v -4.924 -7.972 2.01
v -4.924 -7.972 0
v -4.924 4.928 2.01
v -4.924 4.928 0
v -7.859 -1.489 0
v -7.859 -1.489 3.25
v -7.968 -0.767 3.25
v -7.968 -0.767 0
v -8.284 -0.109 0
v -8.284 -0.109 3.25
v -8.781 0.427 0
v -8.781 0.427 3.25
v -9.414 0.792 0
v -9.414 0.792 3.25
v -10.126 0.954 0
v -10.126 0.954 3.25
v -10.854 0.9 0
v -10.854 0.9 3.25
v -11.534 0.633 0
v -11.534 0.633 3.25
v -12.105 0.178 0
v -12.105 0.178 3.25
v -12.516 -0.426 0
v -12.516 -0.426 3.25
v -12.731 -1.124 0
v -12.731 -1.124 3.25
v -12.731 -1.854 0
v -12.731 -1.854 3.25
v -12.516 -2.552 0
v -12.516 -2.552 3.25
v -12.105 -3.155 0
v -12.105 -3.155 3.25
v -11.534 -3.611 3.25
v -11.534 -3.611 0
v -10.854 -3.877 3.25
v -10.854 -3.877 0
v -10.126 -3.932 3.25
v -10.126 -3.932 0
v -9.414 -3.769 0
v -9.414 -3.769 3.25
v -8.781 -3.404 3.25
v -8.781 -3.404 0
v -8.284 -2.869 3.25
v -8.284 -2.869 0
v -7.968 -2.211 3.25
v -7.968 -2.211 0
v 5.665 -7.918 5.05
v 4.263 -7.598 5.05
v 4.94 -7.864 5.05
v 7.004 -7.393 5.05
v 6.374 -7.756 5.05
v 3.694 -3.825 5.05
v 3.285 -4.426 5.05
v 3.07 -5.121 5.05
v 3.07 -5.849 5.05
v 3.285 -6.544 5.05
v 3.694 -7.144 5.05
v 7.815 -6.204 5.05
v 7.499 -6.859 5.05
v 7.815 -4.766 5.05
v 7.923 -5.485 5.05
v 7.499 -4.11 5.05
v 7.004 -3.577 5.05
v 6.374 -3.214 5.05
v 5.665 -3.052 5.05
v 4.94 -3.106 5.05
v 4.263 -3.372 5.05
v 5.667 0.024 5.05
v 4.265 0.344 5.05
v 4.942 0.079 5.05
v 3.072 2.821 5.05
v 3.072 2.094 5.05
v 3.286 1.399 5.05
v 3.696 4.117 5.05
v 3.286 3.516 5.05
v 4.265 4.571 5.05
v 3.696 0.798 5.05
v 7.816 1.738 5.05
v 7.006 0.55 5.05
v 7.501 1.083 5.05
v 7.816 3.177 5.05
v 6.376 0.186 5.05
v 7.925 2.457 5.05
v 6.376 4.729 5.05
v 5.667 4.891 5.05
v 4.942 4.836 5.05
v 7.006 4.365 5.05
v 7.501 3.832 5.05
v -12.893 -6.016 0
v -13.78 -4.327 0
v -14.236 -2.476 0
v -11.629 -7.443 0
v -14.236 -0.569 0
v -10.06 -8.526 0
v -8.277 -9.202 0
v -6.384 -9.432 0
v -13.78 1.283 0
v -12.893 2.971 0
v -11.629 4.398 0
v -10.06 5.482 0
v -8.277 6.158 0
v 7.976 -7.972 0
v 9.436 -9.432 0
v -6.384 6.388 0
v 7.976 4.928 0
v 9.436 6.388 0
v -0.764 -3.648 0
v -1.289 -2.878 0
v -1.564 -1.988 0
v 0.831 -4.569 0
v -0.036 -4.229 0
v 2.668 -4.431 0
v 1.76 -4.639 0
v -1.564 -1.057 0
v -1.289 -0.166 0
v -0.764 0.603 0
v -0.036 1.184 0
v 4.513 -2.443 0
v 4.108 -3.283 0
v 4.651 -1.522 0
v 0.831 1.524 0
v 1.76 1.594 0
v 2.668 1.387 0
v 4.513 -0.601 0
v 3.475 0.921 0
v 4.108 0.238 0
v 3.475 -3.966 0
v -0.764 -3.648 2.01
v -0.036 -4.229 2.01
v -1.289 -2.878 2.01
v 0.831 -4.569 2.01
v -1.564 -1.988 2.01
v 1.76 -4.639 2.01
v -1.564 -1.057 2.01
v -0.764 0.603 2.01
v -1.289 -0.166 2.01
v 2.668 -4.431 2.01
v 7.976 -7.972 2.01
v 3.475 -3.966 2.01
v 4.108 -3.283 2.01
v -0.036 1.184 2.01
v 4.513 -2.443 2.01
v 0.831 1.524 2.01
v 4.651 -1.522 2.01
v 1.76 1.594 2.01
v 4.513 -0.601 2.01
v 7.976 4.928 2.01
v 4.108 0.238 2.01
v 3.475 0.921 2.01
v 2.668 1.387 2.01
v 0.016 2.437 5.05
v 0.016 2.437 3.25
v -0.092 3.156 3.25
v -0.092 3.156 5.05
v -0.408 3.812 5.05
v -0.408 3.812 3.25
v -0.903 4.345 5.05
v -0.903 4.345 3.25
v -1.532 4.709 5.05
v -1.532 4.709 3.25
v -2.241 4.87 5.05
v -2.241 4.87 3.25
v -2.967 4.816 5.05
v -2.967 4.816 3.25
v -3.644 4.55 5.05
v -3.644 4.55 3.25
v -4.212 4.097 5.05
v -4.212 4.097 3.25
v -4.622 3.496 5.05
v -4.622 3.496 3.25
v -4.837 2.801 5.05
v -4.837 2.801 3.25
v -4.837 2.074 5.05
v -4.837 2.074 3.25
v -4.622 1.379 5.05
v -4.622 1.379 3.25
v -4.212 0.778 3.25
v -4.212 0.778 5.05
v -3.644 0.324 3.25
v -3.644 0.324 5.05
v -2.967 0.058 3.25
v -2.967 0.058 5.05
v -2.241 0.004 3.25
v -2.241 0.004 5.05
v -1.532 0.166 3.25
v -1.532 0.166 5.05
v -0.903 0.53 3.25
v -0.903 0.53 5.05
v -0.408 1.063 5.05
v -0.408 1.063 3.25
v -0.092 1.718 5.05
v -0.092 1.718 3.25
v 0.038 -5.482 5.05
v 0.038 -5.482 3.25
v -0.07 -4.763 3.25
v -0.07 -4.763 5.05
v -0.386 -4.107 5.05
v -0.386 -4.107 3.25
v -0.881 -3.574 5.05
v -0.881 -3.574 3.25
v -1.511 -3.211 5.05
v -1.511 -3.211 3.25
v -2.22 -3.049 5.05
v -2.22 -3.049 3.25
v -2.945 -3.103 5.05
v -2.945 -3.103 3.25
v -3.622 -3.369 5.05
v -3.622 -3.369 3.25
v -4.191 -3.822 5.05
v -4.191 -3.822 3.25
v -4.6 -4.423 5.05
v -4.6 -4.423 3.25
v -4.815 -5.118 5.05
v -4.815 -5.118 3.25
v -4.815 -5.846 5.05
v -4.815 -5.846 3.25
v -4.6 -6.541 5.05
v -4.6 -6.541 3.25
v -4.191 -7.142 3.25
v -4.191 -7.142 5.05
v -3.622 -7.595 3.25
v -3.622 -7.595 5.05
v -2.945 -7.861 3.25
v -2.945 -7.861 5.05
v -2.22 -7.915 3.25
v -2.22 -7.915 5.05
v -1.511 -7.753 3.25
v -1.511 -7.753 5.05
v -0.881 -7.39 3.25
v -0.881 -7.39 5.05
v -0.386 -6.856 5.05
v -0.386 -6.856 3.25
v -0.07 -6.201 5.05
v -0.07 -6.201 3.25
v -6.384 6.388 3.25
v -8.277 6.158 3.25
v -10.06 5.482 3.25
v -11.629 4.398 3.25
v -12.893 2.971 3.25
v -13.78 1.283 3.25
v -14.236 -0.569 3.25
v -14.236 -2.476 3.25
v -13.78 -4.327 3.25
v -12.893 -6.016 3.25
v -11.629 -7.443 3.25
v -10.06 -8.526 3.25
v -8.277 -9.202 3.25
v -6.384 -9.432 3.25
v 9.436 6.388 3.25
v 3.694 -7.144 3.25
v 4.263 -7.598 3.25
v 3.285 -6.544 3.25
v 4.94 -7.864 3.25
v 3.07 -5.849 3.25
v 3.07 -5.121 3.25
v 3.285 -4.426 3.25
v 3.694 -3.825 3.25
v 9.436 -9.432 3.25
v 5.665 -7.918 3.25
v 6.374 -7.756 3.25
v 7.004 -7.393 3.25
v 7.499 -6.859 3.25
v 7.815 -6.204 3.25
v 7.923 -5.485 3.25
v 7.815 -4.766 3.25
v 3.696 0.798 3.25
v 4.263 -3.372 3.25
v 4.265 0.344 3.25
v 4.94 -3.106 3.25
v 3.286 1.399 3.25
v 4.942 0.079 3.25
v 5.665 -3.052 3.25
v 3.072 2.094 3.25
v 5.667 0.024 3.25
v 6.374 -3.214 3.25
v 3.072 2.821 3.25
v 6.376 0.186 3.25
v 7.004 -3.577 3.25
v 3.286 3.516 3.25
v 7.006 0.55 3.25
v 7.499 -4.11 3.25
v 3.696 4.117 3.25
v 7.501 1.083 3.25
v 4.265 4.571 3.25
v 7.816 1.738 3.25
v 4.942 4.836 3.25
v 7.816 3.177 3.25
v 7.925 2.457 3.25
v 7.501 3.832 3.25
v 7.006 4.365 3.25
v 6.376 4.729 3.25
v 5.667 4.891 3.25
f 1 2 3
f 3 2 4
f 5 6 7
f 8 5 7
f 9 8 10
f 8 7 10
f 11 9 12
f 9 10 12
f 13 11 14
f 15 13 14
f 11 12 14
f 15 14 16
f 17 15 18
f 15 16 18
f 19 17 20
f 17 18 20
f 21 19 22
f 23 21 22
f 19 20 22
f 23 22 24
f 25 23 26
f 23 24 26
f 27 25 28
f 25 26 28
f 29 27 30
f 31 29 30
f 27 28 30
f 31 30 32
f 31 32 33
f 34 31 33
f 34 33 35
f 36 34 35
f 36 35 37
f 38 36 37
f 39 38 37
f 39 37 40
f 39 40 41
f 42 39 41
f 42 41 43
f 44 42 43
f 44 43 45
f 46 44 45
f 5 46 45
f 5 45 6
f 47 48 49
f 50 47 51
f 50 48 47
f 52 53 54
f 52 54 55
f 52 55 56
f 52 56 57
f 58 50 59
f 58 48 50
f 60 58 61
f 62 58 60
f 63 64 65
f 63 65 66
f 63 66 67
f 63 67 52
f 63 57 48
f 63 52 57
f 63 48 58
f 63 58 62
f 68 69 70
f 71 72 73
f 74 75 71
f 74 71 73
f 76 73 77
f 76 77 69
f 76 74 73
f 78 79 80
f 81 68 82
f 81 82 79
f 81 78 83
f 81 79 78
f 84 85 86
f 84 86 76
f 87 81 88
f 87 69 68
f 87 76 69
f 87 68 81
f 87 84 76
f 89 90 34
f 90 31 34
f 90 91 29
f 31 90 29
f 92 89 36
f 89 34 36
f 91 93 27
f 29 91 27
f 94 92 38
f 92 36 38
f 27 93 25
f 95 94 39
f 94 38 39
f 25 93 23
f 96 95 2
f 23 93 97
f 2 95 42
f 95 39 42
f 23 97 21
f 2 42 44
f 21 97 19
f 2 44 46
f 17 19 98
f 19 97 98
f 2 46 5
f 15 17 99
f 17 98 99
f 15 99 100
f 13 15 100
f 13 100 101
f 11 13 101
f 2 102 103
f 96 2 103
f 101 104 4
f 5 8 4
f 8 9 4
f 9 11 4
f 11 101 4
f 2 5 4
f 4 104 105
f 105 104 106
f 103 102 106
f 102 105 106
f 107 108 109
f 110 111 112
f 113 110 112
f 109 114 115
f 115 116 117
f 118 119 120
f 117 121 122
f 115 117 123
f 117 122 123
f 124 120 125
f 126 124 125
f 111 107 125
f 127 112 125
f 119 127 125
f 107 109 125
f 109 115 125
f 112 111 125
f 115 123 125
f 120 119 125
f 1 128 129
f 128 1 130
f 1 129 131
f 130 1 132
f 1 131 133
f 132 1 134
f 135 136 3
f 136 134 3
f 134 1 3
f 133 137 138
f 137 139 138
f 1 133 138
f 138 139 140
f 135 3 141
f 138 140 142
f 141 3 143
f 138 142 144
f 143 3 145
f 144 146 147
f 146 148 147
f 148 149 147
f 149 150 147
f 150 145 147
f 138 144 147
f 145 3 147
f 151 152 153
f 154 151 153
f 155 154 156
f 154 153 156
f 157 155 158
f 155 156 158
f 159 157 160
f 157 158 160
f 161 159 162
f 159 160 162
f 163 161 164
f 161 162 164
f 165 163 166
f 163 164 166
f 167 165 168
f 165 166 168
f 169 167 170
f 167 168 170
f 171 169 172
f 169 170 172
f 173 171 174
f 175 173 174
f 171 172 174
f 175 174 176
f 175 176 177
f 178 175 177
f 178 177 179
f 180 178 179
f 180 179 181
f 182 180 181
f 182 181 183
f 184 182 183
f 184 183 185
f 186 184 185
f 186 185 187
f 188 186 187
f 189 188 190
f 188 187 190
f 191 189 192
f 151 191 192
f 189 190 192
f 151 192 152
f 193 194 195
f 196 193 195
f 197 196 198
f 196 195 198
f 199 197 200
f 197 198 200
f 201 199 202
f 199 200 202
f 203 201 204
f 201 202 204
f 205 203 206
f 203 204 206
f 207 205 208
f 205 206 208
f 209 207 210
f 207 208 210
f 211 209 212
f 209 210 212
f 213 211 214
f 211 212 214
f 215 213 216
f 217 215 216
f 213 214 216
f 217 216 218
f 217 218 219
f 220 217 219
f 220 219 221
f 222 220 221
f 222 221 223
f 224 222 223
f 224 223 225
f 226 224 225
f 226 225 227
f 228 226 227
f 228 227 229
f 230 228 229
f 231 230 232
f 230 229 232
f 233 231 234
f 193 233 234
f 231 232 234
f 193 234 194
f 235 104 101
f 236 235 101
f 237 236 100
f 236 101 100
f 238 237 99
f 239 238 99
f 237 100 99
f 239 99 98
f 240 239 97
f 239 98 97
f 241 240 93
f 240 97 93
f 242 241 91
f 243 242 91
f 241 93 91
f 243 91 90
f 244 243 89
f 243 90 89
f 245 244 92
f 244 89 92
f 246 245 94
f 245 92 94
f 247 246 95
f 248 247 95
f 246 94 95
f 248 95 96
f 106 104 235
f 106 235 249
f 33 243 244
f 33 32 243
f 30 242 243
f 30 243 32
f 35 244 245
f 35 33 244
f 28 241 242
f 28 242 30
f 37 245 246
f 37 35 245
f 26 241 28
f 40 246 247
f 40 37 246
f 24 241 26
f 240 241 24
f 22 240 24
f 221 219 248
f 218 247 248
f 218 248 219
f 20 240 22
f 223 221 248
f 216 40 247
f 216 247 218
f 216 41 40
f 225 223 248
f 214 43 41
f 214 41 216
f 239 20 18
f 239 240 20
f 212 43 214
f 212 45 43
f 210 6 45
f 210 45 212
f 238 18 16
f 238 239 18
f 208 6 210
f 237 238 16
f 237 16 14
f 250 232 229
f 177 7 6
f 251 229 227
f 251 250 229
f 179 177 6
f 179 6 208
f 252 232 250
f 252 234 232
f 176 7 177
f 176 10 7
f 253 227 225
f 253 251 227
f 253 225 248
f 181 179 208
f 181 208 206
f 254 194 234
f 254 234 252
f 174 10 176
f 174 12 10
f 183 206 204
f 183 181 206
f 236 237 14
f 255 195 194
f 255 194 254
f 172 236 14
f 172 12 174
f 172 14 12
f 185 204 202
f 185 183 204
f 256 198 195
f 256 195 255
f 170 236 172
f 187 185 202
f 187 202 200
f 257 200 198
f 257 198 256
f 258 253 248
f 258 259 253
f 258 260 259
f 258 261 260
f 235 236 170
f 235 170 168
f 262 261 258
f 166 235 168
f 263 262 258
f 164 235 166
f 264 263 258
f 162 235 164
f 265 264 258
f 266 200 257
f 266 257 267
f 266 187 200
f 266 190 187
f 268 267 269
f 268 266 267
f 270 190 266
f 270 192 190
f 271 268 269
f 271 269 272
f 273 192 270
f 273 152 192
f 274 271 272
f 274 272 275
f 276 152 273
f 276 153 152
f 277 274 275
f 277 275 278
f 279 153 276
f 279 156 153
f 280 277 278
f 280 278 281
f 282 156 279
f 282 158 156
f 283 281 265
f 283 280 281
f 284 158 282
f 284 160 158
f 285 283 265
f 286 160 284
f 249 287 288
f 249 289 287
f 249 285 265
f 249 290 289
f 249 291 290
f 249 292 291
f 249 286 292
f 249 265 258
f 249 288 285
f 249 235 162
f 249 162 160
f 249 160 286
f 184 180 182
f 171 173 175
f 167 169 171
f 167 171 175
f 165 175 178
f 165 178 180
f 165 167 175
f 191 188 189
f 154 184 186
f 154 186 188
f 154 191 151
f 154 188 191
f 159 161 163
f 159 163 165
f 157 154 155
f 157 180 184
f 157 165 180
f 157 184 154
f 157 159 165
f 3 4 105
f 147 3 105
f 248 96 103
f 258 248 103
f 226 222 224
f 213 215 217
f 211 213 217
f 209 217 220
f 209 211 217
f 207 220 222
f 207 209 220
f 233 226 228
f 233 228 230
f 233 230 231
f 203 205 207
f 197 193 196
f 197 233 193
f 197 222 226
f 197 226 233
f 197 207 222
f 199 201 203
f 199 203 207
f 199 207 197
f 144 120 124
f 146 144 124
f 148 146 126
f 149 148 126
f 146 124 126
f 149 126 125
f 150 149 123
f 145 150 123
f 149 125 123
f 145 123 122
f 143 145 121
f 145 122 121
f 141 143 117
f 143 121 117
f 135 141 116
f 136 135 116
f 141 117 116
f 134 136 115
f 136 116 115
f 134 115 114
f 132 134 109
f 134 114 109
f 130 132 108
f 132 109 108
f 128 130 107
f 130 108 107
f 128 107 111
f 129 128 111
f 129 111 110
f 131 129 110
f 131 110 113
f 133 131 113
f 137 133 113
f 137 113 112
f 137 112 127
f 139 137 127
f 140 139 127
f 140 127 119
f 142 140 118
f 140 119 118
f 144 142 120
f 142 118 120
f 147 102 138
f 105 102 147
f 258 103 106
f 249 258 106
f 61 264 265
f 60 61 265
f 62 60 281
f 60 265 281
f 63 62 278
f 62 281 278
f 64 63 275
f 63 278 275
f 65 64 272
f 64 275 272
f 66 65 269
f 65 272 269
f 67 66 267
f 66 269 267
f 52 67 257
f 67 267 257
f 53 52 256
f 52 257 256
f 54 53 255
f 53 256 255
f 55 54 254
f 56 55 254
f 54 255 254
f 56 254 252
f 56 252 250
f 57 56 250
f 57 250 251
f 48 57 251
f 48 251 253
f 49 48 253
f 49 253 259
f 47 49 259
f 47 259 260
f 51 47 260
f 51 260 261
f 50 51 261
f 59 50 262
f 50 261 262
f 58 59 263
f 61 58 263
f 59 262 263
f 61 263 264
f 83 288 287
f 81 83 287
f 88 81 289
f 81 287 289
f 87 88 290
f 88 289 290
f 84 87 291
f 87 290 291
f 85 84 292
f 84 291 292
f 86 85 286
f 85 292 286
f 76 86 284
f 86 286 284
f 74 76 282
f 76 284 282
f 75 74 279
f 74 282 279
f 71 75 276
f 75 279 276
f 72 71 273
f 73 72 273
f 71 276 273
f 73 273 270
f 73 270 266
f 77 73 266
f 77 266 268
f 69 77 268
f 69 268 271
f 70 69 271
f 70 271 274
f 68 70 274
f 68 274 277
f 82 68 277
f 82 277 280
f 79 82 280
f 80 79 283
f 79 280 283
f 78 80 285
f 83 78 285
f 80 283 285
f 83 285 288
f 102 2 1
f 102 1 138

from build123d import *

# Parameters (mm, degrees)
F0_W     = 15.82
F0_H     = 15.82
F1_DEPTH = 3.25
F2_R     = 2.44
F3_DEPTH = 1.8
F4_W     = 12.9
F4_H     = 12.9
F4_R     = 3.125
F5_DEPTH = 2.01
F6_R     = 2.45
F7_DEPTH = 25


with BuildPart() as f1:
    # F0 (on Top) → F1 (new body)
    with BuildSketch(Plane.XY):
        with Locations((1.526456, -1.522328)):
            Rectangle(F0_W, F0_H)
        with BuildLine():
            ThreePointArc((-6.383544, 6.387672), (-14.293544, -1.522328), (-6.383544, -9.432328))
            Line((-6.383544, -9.432328), (-6.383544, 6.387672))
        make_face()
    extrude(amount=F1_DEPTH)

    # F2 (on face) → F3 (join)
    with BuildSketch(Plane.XY.offset(3.25)):
        with Locations((-2.423831, 2.437297)):
            Circle(F2_R)
        with Locations((5.484728, 2.457458)):
            Circle(F2_R)
        with Locations((5.483022, -5.48487)):
            Circle(F2_R)
        with Locations((-2.401933, -5.481959)):
            Circle(F2_R)
    extrude(amount=F3_DEPTH)

    # F4 (on face) → F5 (cut)
    with BuildSketch(Plane.XY):
        with Locations((1.526456, -1.522328)):
            Rectangle(F4_W, F4_H)
        with Locations((1.526456, -1.522328)):
            Circle(F4_R, mode=Mode.SUBTRACT)
    extrude(amount=F5_DEPTH, mode=Mode.SUBTRACT)

    # F6 (on face) → F7 (cut)
    with BuildSketch(Plane.XY.offset(3.25)):
        with Locations((-10.308685, -1.488805)):
            Circle(F6_R)
    extrude(amount=-F7_DEPTH, mode=Mode.SUBTRACT)


solid = f1.part
